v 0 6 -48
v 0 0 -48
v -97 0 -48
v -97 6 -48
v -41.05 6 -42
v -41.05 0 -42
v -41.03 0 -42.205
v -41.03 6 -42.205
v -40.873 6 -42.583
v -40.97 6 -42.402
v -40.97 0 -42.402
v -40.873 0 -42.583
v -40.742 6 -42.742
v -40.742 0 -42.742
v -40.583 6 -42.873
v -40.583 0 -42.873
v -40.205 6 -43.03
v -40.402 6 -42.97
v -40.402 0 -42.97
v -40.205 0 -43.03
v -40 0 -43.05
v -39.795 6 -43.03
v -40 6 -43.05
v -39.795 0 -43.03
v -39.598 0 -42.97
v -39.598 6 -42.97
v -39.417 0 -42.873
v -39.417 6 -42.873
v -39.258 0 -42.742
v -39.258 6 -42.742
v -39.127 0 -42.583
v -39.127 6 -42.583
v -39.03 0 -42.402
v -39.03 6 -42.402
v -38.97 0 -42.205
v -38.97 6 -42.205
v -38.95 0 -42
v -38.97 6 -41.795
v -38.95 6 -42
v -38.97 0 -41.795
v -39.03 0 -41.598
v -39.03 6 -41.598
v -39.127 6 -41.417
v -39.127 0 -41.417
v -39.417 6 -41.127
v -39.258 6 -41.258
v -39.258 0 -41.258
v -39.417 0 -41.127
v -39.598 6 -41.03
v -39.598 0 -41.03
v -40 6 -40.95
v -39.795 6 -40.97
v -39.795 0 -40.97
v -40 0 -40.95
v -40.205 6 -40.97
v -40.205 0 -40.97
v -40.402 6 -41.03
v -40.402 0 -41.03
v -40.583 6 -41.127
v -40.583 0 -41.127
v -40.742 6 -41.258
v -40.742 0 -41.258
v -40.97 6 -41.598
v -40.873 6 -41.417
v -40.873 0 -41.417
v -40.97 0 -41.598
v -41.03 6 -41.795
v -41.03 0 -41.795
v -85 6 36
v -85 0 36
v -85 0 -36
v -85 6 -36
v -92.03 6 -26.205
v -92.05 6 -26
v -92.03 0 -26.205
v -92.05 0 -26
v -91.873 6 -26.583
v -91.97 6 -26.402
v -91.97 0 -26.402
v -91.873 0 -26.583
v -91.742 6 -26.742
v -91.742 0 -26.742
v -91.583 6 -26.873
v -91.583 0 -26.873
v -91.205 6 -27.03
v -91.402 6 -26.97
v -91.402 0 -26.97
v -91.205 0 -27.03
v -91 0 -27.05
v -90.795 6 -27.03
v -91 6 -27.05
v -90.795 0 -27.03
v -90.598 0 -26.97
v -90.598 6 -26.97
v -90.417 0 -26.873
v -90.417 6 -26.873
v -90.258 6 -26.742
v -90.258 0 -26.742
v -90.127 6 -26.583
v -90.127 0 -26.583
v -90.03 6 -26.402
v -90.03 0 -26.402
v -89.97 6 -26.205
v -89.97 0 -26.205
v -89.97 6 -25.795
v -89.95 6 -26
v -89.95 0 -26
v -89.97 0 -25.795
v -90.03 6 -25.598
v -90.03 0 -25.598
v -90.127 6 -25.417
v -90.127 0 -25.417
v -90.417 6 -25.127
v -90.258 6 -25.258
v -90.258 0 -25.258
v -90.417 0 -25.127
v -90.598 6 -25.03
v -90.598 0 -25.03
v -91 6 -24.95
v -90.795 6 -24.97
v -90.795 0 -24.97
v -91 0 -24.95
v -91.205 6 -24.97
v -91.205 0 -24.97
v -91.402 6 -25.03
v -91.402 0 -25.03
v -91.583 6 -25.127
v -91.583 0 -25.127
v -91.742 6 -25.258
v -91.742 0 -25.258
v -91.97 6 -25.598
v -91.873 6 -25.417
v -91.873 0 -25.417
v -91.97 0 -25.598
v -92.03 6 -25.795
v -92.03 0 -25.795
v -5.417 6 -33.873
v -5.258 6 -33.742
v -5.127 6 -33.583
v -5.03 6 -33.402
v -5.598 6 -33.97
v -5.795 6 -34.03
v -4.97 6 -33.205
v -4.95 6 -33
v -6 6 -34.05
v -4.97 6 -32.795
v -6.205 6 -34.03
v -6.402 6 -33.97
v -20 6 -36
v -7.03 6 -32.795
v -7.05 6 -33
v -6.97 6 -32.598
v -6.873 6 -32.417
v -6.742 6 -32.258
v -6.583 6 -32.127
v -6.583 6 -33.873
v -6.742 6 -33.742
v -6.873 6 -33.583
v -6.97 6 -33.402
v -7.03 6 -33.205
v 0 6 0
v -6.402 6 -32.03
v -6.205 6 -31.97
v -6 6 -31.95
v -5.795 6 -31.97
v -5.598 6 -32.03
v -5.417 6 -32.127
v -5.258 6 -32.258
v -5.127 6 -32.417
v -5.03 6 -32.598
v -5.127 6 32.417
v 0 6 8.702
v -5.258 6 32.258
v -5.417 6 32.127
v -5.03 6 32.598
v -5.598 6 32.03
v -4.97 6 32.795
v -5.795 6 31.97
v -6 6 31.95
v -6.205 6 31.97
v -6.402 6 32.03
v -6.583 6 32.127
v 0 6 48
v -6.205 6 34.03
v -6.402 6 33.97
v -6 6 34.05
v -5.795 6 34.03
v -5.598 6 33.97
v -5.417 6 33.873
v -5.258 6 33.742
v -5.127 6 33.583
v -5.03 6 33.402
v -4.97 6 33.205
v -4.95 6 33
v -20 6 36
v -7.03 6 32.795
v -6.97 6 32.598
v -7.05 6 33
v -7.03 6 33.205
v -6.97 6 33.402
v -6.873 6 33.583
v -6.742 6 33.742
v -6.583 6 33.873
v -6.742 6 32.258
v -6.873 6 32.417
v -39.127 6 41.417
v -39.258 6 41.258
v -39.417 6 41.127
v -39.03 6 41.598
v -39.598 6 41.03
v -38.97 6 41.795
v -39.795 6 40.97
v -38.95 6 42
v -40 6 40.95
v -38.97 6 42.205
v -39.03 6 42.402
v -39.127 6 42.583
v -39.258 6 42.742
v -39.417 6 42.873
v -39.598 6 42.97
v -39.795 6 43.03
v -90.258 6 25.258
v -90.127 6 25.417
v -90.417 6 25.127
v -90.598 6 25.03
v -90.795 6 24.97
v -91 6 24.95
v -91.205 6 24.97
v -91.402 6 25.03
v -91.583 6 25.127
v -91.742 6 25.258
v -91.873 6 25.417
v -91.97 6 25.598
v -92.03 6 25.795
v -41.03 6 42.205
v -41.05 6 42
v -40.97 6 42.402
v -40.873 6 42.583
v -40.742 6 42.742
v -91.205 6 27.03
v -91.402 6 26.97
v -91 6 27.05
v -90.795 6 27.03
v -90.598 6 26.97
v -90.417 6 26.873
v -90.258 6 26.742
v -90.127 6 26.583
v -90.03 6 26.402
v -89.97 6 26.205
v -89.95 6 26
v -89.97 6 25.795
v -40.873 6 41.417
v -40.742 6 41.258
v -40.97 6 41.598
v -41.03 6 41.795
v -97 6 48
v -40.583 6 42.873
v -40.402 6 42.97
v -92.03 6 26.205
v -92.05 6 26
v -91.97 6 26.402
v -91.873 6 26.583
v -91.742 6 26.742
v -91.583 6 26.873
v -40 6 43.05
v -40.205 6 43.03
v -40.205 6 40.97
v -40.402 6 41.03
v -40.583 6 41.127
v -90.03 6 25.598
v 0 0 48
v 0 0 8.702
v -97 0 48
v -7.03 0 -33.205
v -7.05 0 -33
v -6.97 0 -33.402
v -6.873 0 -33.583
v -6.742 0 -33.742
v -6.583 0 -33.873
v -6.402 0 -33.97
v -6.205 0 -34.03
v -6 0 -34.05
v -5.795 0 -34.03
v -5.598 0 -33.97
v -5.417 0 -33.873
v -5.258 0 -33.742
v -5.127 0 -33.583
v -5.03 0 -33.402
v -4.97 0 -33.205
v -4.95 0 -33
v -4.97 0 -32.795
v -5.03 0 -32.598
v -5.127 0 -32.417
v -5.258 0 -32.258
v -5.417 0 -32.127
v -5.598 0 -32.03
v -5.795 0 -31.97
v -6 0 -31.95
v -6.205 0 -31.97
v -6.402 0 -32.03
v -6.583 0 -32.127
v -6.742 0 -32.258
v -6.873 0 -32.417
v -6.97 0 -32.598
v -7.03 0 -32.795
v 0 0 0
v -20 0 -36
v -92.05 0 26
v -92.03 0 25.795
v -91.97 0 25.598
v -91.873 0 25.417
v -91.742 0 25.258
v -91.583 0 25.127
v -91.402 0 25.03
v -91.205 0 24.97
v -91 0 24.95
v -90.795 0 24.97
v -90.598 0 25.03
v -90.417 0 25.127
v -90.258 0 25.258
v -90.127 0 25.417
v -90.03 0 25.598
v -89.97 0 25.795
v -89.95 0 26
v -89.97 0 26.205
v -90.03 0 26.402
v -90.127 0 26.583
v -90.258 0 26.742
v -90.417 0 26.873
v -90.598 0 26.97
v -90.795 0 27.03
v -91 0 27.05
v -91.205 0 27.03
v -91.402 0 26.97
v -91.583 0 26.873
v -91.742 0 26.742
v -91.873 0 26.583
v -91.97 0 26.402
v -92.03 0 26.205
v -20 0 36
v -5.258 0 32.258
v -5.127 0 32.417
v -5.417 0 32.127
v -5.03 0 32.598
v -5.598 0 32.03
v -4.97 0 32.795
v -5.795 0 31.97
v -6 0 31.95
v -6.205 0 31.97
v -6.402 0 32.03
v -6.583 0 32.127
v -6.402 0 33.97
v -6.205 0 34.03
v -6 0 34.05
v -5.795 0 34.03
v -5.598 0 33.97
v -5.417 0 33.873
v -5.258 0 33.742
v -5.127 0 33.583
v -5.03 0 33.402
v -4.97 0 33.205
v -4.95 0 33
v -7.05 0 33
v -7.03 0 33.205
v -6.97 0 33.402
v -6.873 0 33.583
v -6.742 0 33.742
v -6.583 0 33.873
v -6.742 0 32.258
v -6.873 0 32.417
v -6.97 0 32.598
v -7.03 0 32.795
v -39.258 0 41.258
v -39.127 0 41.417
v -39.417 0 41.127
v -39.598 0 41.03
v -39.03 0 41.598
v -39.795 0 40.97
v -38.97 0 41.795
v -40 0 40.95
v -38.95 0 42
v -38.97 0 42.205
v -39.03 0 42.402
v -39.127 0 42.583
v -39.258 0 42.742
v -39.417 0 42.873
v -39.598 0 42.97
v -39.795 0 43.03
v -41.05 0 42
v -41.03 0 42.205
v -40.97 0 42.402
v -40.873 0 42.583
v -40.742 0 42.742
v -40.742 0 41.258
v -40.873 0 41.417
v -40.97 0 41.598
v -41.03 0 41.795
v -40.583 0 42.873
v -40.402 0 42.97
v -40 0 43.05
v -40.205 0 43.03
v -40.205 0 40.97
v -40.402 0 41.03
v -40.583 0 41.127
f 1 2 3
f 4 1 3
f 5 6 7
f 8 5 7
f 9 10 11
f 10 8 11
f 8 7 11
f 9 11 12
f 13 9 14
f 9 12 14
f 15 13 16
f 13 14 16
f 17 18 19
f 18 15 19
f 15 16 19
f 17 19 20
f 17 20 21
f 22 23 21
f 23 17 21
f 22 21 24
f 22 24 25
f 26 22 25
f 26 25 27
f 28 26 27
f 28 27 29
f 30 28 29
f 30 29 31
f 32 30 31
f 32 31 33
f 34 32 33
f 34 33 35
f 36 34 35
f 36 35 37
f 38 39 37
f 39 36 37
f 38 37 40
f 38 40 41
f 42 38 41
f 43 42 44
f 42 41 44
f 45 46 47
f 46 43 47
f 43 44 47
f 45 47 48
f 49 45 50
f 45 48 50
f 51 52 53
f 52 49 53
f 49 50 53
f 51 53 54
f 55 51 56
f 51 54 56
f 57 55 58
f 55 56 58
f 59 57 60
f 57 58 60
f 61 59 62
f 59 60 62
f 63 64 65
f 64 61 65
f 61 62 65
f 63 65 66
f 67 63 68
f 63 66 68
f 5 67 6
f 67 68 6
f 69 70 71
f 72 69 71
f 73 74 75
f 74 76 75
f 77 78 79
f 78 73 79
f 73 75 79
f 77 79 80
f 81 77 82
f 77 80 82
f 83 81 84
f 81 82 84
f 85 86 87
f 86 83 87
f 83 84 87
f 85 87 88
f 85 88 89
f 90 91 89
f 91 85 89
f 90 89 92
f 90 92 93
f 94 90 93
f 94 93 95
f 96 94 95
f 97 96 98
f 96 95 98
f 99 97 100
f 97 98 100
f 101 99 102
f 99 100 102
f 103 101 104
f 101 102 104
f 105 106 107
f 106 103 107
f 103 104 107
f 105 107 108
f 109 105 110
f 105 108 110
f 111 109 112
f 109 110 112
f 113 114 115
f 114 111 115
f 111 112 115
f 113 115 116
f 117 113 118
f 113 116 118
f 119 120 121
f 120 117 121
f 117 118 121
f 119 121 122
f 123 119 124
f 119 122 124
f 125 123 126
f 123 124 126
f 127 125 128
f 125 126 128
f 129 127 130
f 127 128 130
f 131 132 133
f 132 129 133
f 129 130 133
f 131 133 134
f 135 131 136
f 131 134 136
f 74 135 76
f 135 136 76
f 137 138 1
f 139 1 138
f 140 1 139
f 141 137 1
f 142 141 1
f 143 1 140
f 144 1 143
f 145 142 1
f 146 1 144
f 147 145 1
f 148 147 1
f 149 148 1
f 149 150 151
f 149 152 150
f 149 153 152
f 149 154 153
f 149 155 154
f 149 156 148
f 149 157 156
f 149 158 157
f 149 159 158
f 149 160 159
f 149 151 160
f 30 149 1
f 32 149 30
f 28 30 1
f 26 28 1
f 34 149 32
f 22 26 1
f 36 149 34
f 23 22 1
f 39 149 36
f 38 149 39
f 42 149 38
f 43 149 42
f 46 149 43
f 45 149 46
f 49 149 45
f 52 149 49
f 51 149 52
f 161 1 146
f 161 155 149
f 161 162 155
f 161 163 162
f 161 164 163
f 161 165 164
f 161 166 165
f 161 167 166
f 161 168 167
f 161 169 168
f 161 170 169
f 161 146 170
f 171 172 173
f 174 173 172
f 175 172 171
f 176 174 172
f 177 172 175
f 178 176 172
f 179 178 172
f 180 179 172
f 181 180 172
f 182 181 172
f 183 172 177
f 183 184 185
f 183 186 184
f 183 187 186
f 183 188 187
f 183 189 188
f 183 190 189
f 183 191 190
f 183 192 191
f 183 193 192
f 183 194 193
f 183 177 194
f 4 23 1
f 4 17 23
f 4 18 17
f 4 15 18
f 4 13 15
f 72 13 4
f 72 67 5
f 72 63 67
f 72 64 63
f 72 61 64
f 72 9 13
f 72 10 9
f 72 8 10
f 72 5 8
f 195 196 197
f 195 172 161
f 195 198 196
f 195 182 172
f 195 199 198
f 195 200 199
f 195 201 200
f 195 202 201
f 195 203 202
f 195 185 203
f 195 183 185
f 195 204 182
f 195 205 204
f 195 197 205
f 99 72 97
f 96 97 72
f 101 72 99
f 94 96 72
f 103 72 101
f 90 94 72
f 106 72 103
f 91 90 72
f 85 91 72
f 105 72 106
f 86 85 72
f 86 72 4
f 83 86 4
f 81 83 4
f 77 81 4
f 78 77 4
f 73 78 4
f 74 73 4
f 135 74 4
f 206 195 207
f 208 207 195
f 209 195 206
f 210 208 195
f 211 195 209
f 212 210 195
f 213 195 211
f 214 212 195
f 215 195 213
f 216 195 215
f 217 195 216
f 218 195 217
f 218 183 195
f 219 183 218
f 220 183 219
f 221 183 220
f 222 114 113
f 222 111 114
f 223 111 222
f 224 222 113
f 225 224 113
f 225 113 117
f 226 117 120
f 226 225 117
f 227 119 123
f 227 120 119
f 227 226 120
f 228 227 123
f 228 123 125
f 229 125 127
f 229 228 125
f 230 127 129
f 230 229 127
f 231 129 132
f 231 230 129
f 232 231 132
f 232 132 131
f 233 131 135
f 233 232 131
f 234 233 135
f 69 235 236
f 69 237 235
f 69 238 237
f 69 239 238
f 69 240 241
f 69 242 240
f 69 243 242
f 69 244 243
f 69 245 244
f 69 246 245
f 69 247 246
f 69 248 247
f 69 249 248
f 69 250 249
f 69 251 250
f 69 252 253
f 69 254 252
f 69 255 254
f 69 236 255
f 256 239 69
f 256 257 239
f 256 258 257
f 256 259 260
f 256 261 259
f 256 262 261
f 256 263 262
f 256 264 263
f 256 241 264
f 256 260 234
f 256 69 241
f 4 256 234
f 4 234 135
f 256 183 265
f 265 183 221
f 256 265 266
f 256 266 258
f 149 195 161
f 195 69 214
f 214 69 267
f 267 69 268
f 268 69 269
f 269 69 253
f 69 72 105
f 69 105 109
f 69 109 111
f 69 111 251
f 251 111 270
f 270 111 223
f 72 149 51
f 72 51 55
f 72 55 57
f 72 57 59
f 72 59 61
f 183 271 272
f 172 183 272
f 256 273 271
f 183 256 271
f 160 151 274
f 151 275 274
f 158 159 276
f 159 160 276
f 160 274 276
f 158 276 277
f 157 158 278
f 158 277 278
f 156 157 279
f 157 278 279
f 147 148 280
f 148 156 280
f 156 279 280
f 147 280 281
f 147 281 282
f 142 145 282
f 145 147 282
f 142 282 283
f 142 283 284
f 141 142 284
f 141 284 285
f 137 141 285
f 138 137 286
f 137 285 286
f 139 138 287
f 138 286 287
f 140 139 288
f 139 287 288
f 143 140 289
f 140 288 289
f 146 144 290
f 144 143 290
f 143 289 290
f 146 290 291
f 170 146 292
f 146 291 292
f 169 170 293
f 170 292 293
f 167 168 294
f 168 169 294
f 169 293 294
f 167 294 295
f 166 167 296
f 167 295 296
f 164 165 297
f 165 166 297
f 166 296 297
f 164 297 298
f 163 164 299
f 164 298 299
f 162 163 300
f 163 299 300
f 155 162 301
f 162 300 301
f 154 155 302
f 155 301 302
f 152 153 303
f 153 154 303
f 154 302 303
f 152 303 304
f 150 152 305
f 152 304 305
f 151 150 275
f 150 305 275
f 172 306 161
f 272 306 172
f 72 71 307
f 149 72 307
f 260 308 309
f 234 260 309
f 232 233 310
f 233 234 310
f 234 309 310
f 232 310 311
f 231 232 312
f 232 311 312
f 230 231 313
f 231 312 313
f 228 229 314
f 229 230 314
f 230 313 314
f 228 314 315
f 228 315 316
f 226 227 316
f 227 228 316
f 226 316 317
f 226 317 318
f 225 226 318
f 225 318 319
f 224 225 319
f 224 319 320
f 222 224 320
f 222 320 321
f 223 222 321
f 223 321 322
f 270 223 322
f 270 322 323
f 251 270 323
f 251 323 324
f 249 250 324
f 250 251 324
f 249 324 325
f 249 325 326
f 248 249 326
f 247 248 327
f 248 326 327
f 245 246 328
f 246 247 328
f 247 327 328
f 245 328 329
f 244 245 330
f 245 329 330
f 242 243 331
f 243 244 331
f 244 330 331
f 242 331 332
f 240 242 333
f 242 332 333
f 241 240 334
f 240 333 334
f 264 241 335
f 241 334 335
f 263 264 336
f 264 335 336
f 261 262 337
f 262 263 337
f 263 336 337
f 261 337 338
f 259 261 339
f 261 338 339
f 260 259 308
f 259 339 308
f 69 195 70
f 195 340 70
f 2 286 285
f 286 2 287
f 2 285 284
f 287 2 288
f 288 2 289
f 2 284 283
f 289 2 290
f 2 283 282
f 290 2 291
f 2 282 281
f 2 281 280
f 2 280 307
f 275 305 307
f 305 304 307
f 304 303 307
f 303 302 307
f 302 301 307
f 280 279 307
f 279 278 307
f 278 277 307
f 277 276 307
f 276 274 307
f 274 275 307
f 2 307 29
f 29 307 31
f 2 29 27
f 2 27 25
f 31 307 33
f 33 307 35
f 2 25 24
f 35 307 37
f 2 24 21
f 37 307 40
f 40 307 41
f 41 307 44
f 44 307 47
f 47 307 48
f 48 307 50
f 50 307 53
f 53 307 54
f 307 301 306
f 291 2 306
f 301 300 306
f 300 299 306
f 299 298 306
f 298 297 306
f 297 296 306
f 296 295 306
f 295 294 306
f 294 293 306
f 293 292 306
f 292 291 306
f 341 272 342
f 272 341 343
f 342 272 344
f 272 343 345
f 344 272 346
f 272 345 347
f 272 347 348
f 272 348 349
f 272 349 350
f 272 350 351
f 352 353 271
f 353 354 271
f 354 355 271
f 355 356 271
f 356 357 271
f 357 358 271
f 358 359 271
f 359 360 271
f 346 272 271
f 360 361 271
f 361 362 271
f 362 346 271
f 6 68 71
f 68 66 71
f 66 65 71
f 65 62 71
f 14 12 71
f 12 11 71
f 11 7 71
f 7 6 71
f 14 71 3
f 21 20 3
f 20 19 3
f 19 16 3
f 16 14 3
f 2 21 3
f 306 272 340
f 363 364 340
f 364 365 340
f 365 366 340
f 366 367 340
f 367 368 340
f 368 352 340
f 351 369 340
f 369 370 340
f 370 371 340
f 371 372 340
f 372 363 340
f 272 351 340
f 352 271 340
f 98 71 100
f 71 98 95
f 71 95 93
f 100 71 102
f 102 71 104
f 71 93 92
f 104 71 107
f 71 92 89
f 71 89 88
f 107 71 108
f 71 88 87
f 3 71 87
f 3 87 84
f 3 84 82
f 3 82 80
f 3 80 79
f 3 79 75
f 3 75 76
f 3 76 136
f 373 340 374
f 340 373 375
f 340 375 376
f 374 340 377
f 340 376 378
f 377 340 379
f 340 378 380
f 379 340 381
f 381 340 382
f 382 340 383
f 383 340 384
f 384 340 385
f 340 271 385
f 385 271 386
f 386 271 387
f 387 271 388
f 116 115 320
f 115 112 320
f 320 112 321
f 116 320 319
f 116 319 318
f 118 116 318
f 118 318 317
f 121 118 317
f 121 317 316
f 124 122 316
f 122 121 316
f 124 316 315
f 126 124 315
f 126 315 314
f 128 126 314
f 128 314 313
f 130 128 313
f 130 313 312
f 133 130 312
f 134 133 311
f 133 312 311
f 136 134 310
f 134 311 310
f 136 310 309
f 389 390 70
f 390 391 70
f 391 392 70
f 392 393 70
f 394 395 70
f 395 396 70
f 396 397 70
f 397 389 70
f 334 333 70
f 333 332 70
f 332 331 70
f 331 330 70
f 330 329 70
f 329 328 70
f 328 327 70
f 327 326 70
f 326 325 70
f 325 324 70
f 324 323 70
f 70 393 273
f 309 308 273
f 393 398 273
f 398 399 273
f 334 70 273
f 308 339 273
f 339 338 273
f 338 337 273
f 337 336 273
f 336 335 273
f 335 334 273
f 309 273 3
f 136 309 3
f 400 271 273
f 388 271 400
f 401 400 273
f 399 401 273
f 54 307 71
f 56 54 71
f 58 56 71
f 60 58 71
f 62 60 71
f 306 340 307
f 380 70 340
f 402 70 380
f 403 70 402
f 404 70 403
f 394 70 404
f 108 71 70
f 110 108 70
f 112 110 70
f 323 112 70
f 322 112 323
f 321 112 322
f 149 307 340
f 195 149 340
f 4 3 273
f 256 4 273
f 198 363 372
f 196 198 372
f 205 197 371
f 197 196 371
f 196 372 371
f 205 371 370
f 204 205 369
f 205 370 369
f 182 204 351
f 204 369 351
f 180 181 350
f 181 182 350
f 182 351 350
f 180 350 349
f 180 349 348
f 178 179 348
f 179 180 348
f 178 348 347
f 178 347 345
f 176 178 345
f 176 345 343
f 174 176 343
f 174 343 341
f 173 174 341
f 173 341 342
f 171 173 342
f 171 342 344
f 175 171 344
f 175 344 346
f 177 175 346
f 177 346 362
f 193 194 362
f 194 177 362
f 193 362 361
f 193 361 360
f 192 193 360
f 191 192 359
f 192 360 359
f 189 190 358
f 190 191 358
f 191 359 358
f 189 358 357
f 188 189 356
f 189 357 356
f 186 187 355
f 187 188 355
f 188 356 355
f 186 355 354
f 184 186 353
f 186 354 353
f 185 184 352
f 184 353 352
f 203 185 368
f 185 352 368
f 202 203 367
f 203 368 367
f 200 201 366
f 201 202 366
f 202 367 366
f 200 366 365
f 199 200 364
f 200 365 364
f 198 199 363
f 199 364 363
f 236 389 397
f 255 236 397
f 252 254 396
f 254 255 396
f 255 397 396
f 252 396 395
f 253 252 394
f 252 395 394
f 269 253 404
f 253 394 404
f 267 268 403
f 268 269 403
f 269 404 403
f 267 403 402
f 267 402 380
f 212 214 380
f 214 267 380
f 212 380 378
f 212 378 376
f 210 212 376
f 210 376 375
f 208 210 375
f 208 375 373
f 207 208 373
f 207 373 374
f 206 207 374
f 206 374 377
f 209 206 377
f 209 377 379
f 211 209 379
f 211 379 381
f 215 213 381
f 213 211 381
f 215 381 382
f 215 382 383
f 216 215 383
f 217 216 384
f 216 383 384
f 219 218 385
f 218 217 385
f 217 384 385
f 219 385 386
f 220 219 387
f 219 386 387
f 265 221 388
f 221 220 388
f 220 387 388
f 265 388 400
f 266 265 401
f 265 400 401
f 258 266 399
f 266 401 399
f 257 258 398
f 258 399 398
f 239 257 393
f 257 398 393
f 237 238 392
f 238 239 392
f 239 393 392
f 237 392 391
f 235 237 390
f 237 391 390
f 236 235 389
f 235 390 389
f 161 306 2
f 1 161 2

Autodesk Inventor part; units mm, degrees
ref_plane "YZ Plane" through (0, 0, 0) normal (1, 0, 0) x (0, 1, 0)
ref_plane "XZ Plane" through (0, 0, 0) normal (0, 1, 0) x (-1, 0, 0)
ref_plane "XY Plane" through (0, 0, 0) normal (0, 0, 1) x (1, 0, 0)
sketch "Sketch1" plane through (0, 0, 0) normal (0, 1, 0) x (-1, 0, 0)
  line L0 (0, 0) -> (-5.6352, 0)
  line L1 (-5.6352, 0) -> (0, 0)
  line L2 (0, 0) -> (0, 8.7024)
  line L3 (0, -48) -> (97, -48)
  line L4 (97, -48) -> (97, 48)
  line L5 (97, 48) -> (0, 48)
  line L6 (0, 48) -> (0, -48)
  line L7 (85, -36) -> (20, -36)
  line L8 (20, -36) -> (20, 36)
  line L9 (20, 36) -> (85, 36)
  line L10 (85, 36) -> (85, -36)
  circle A0 centre (6, 33) radius 1.05
  circle A1 centre (6, -33) radius 1.05
  circle A2 centre (40, 42) radius 1.05
  circle A3 centre (91, 26) radius 1.05
  circle A4 centre (40, -42) radius 1.05
  circle A5 centre (91, -26) radius 1.05
  point P0 (0, -8.7024)
  dimension "d22" = 12
  dimension "d23" = 12
  dimension "d24" = 12
  dimension "d25" = 20
  dimension "d26" = 65
  dimension "d28" = 2.1
  dimension "d30" = 3
  dimension "d31" = 72
  dimension "d32" = 6
  dimension "d33" = 6
  dimension "d34" = 6
  dimension "d35" = 20
  dimension "d36" = 10
extrude "Extrusion1" add sketch "Sketch1" along normal blind 6
equation "\"d22\" = d23"
equation "\"d24\" = d23"
properties part number "case_back_fix" material "Acrylic, Clear"
